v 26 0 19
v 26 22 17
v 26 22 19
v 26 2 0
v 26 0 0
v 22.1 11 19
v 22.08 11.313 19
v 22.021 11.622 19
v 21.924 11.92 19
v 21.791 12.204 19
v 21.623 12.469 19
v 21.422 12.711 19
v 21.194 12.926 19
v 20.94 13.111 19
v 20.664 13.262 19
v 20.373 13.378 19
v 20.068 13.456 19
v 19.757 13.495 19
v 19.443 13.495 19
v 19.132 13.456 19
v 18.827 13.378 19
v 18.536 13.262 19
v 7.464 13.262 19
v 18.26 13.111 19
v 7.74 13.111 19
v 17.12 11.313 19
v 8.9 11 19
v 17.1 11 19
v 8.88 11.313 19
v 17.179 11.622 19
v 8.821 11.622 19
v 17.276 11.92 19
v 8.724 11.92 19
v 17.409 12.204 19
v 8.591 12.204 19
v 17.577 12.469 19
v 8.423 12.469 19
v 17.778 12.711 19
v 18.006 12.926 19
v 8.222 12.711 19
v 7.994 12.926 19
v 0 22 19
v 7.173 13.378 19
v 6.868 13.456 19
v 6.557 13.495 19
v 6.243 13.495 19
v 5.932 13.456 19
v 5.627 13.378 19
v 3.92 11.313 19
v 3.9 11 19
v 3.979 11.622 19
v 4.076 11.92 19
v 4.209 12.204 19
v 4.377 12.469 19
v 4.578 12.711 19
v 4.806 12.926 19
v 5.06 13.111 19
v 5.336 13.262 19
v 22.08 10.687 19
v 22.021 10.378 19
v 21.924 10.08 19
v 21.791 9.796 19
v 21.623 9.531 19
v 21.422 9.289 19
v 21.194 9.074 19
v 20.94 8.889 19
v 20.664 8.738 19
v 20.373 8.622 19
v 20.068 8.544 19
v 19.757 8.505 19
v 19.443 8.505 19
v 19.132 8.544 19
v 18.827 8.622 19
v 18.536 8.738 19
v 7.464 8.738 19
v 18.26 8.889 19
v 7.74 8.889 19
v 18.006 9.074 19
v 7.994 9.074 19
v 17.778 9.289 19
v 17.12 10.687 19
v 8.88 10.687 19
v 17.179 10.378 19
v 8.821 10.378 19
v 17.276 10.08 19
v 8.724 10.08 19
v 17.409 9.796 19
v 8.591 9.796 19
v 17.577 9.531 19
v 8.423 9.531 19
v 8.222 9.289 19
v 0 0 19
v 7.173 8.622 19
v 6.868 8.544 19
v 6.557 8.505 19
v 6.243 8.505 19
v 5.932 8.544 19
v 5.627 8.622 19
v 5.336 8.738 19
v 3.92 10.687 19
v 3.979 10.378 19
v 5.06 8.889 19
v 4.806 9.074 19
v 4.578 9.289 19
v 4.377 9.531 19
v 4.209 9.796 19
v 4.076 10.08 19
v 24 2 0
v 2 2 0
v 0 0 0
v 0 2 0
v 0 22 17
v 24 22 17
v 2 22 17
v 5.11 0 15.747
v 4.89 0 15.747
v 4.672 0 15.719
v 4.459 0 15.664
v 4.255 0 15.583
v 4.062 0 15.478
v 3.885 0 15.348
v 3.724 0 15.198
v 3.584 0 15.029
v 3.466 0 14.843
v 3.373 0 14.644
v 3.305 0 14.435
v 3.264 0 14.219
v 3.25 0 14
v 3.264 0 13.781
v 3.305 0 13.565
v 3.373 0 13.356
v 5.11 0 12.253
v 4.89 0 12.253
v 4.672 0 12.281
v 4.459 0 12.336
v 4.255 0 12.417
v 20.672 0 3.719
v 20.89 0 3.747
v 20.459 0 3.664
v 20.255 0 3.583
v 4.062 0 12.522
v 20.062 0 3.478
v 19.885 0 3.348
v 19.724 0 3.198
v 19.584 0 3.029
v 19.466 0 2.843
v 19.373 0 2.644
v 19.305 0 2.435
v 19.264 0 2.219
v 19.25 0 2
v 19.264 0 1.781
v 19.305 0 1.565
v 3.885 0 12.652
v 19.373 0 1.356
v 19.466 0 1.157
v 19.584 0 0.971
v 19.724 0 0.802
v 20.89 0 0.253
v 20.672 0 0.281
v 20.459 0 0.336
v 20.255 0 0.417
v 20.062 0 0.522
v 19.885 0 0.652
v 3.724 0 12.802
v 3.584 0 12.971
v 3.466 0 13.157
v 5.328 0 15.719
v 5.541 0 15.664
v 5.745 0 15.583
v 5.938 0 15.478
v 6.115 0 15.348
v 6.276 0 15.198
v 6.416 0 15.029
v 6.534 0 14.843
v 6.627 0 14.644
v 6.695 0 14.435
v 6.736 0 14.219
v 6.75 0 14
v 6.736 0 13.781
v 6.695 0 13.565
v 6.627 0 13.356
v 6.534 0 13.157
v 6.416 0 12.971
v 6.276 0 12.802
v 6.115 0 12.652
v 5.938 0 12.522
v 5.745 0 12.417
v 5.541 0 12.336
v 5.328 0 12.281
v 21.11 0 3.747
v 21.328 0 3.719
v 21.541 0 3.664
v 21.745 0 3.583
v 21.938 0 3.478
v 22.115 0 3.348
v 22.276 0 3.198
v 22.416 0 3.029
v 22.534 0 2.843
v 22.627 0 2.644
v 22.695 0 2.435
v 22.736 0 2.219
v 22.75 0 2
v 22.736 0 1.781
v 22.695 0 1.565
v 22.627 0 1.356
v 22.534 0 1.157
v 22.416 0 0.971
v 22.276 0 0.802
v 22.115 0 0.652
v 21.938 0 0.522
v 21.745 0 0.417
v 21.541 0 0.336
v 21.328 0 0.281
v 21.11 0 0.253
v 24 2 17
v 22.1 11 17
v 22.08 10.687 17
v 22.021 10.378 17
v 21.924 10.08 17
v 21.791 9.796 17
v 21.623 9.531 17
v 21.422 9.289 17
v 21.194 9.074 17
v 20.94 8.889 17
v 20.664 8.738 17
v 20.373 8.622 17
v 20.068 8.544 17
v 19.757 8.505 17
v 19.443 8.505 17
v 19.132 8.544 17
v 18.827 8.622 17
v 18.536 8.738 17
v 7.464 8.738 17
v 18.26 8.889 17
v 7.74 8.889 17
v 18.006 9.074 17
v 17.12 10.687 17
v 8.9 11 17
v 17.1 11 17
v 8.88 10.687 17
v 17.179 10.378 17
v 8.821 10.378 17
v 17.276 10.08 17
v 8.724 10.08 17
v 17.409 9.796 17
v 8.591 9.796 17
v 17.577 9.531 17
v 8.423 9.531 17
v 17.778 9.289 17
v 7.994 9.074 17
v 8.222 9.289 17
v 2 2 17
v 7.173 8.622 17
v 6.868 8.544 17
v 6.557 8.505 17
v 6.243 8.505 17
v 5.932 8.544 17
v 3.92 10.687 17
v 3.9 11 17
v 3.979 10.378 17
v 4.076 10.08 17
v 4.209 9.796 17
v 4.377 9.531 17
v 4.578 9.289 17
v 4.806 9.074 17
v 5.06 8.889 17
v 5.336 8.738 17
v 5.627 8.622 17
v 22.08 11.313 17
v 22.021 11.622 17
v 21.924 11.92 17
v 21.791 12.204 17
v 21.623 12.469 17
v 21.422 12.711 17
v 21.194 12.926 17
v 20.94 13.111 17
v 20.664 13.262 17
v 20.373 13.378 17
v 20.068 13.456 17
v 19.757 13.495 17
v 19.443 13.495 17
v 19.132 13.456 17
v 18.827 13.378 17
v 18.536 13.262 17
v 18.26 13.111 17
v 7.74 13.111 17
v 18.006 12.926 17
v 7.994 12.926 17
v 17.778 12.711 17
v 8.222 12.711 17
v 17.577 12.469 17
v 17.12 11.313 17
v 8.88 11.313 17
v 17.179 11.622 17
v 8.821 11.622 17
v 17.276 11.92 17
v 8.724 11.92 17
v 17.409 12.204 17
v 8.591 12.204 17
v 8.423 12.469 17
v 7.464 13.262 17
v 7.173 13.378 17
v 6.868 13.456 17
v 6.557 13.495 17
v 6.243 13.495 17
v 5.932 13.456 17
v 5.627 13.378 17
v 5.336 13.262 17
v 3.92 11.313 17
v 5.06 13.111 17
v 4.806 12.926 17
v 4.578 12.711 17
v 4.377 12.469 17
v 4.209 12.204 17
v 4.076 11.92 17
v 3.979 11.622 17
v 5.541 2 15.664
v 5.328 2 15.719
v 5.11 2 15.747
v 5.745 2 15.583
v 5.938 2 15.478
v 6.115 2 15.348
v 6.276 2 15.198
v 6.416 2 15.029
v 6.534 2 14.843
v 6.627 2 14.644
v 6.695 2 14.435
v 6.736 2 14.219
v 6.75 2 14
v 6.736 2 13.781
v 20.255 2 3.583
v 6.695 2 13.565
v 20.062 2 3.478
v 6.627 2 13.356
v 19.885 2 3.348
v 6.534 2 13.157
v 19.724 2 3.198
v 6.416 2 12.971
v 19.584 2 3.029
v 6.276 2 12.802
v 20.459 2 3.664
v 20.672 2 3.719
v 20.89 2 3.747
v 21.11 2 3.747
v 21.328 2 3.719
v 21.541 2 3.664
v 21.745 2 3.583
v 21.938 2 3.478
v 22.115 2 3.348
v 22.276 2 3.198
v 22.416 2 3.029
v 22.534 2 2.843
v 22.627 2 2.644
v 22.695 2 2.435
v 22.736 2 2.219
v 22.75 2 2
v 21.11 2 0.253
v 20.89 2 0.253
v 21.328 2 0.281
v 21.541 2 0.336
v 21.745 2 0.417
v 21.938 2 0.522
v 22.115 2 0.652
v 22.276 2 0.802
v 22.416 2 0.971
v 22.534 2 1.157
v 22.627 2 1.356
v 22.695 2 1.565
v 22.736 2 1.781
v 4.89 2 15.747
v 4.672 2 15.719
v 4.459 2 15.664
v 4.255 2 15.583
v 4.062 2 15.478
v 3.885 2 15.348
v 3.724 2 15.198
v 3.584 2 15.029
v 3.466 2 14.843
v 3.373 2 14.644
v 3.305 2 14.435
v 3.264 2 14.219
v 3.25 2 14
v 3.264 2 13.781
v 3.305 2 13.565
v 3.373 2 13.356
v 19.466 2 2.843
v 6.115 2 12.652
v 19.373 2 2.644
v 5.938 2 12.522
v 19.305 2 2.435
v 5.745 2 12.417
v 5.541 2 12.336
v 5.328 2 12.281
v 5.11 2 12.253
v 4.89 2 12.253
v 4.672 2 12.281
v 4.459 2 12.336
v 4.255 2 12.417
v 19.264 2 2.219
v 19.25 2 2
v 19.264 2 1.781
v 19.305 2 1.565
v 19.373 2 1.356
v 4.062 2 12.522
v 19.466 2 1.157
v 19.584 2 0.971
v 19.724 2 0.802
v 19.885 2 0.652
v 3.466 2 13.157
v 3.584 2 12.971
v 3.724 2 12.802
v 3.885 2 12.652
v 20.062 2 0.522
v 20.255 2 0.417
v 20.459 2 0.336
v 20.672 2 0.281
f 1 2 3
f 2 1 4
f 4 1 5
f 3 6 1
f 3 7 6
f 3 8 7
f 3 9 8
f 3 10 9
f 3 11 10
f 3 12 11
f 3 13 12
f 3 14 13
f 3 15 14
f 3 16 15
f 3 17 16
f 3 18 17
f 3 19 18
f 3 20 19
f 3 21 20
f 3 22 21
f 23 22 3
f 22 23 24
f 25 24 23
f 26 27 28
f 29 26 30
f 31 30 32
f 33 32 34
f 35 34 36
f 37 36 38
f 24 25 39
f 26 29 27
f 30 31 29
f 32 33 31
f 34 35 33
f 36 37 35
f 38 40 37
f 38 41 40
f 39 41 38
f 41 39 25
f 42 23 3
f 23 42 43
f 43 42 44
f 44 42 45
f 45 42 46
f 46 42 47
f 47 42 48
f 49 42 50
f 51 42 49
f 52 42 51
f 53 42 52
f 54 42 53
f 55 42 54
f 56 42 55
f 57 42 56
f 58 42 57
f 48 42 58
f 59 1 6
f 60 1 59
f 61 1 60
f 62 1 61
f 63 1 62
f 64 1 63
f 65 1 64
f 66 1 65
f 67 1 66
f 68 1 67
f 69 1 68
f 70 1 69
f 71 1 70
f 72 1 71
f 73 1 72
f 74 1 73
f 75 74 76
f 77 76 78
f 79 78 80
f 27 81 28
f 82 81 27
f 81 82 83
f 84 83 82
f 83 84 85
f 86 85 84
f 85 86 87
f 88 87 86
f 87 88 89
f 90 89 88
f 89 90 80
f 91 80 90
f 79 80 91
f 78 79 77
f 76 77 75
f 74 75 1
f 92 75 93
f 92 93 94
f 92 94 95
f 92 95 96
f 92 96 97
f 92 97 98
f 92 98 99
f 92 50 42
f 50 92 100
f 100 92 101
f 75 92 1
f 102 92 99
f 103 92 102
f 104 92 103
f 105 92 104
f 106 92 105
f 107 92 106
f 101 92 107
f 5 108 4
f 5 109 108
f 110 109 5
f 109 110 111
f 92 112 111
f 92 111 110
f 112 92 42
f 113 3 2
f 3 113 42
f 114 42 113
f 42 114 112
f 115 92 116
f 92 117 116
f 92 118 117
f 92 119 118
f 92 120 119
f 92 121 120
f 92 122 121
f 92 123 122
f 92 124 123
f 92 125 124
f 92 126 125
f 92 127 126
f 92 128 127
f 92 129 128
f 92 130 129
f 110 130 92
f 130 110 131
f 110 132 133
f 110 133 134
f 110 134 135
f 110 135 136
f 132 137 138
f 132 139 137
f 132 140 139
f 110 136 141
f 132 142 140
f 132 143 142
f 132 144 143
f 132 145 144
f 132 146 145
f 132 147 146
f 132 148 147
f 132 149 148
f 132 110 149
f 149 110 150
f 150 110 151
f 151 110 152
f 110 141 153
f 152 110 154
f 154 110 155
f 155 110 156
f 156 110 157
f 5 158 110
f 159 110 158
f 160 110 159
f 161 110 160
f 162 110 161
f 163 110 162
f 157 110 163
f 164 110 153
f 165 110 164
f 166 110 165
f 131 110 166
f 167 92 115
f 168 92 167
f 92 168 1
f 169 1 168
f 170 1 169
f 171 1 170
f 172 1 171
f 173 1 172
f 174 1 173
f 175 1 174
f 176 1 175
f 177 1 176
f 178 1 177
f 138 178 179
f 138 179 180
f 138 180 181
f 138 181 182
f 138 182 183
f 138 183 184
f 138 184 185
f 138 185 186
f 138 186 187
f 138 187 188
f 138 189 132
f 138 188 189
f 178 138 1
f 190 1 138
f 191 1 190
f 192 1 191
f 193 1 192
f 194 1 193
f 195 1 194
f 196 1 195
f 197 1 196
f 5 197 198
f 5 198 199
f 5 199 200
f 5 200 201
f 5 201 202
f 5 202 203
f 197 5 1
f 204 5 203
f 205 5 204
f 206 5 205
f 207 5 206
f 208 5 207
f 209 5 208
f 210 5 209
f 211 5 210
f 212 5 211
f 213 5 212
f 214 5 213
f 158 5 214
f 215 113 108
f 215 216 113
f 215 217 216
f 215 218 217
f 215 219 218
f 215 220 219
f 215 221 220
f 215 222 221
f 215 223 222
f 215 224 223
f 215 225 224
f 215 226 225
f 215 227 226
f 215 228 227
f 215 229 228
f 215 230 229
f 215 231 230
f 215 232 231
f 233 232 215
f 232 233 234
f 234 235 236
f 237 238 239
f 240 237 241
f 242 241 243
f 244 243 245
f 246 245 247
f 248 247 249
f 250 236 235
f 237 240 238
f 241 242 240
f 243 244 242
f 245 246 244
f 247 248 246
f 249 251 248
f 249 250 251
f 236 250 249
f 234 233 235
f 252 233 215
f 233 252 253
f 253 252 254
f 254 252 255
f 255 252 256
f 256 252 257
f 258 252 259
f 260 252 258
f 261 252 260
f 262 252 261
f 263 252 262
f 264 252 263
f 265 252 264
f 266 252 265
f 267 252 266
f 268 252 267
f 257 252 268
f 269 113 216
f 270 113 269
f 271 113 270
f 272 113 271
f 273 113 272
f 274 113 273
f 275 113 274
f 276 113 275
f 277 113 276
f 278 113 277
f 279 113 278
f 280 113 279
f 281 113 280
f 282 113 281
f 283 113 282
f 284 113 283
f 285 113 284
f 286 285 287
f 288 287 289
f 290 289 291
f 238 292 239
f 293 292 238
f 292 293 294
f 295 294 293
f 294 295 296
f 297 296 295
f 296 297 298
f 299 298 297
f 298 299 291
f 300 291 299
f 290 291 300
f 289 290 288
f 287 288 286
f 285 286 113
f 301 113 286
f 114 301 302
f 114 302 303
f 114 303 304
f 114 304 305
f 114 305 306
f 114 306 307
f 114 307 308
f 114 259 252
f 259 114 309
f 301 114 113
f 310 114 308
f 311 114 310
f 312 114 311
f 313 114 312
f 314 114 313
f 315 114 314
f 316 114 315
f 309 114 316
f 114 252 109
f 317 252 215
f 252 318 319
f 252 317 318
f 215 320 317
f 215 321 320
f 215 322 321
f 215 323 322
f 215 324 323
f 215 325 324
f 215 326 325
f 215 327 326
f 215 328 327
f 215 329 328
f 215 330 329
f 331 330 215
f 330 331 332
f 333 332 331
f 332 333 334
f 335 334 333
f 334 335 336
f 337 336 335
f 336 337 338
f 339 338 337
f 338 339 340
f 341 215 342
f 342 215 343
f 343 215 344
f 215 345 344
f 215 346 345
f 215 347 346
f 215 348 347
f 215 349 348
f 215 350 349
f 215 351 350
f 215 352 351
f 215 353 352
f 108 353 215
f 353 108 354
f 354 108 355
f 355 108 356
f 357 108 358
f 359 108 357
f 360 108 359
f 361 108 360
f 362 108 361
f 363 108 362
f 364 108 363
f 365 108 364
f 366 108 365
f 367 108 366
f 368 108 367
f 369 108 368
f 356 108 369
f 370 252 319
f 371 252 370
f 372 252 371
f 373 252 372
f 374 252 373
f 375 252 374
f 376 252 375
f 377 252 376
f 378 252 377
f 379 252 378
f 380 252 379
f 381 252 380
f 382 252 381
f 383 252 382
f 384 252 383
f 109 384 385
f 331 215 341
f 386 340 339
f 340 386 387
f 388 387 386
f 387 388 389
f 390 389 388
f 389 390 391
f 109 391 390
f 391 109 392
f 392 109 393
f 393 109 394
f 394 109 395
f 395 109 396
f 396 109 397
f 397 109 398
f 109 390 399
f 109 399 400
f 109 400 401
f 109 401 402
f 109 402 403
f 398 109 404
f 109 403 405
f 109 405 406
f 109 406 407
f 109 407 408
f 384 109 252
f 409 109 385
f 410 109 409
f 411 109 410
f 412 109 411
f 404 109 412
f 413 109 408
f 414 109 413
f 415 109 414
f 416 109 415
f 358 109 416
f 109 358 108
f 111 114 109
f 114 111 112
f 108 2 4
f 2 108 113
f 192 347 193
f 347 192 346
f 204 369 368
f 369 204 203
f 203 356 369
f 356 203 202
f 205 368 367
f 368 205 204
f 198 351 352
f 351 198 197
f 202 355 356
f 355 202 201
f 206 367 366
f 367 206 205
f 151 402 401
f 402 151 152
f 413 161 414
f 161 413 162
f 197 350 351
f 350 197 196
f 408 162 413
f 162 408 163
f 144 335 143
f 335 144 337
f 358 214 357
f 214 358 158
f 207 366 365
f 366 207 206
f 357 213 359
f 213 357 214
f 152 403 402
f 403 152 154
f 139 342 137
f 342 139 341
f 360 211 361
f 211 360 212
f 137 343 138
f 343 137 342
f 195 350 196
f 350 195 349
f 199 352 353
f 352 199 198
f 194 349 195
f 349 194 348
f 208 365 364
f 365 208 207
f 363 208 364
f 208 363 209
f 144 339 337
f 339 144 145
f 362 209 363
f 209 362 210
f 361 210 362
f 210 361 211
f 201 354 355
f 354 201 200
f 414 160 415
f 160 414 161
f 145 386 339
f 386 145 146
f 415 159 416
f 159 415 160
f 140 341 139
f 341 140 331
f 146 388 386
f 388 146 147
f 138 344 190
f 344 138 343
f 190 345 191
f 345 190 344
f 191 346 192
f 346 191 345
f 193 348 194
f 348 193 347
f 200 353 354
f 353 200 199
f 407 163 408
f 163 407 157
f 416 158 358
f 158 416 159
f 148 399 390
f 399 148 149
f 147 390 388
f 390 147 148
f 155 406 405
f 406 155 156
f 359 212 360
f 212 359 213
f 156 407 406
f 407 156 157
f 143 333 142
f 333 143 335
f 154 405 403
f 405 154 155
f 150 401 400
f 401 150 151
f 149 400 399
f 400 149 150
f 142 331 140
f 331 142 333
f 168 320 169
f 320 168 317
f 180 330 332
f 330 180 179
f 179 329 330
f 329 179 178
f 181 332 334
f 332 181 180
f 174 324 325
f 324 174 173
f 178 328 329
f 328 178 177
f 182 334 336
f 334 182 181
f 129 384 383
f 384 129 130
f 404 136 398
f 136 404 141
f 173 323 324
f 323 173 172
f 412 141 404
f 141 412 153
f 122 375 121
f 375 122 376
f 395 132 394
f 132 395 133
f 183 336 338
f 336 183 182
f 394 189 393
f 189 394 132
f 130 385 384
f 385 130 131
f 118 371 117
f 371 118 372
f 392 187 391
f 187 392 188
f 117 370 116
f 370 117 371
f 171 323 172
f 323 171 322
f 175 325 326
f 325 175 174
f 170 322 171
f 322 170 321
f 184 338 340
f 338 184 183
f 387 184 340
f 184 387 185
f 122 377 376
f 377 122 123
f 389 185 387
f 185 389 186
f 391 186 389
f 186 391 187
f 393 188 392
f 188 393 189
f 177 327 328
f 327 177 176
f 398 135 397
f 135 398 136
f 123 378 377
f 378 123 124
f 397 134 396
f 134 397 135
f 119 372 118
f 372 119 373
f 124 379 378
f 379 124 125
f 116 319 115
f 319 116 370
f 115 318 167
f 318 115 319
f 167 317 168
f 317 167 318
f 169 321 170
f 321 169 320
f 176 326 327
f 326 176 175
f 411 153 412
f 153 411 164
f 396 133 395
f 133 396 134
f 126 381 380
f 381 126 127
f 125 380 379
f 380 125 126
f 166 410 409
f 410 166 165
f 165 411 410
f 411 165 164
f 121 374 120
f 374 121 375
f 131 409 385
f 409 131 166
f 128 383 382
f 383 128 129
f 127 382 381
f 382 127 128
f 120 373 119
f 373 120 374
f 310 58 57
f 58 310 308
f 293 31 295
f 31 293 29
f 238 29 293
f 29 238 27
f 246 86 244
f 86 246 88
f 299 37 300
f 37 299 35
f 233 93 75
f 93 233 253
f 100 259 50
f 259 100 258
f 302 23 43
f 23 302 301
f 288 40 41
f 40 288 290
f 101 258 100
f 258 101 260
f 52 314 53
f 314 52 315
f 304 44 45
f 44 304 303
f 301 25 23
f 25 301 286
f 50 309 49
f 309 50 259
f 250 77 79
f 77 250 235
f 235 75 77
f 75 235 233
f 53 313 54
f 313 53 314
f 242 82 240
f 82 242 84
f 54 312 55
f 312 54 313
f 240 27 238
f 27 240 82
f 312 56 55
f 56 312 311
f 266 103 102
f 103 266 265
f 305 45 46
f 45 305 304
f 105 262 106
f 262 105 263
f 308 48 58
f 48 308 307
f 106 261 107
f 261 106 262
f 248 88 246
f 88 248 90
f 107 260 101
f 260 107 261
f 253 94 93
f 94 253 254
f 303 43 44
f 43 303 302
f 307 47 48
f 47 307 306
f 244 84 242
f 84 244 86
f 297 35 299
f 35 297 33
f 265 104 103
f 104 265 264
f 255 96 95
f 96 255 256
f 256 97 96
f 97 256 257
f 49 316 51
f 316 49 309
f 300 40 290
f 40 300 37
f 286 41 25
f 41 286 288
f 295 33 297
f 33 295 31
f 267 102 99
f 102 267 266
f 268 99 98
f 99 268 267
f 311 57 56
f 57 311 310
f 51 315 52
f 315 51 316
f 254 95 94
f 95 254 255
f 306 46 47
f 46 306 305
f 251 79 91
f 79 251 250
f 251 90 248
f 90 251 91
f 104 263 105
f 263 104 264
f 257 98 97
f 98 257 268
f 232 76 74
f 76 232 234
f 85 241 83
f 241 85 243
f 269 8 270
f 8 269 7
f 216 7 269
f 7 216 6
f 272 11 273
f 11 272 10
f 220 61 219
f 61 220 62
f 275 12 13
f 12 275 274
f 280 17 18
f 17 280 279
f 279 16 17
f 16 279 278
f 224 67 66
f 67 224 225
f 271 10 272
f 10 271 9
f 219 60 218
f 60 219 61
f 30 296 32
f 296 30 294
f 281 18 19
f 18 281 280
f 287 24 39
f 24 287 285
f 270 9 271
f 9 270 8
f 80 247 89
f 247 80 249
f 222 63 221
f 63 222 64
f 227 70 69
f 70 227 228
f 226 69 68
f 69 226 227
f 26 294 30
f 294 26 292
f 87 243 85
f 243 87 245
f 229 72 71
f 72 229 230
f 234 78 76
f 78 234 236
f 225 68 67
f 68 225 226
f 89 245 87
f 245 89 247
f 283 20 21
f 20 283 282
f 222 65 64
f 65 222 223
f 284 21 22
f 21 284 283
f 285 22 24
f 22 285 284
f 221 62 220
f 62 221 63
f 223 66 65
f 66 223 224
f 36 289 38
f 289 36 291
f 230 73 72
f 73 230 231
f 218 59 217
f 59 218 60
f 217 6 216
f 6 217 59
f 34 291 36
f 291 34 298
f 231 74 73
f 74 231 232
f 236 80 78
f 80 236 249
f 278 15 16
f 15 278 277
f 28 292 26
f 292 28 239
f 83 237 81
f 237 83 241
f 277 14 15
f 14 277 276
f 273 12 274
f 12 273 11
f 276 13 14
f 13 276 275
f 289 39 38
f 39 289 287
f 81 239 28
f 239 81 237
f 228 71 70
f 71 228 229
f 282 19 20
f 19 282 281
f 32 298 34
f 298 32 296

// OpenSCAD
$fn=50;
largeur=22;
profondeur=17;
epaisseur=2;
longueur_haut=20;
dia_trou_capteur=3+0.5;
ecart_bord_trou=3;
dia_trou_haut=5;

module base()
{
    difference()
    {
        cube([largeur+2*epaisseur,longueur_haut+epaisseur,profondeur+epaisseur]);
        //évidement du centre
        translate([epaisseur,epaisseur,-epaisseur])
            cube([largeur,longueur_haut+epaisseur,profondeur+epaisseur]);
        //renforts sur le coté
        translate([-0.1,epaisseur,0])
            rotate([-atan(longueur_haut/profondeur),0,0])
                cube([largeur+2*epaisseur+0.2,longueur_haut+epaisseur,norm([profondeur,longueur_haut])]);
    }
}

module trous_capteurs()
{
    //bas
    translate([largeur+epaisseur-ecart_bord_trou,0,2])
    rotate([-90,0,0])
        translate([0,0,-0.1])
            cylinder(d=dia_trou_capteur,h=epaisseur+0.2);
    //haut
    translate([epaisseur+ecart_bord_trou,0,profondeur-ecart_bord_trou])
    rotate([-90,0,0])
        translate([0,0,-0.1])
            cylinder(d=dia_trou_capteur,h=epaisseur+0.2);
}

module trous_haut()
{
    translate([epaisseur+largeur/5,(longueur_haut+epaisseur)/2,profondeur-0.1])
        cylinder(d=dia_trou_haut,h=epaisseur+0.2);
    translate([epaisseur+largeur*4/5,(longueur_haut+epaisseur)/2,profondeur-0.1])
        cylinder(d=dia_trou_haut,h=epaisseur+0.2);
}

difference()
{
    base();
    trous_capteurs();
    trous_haut();
}
